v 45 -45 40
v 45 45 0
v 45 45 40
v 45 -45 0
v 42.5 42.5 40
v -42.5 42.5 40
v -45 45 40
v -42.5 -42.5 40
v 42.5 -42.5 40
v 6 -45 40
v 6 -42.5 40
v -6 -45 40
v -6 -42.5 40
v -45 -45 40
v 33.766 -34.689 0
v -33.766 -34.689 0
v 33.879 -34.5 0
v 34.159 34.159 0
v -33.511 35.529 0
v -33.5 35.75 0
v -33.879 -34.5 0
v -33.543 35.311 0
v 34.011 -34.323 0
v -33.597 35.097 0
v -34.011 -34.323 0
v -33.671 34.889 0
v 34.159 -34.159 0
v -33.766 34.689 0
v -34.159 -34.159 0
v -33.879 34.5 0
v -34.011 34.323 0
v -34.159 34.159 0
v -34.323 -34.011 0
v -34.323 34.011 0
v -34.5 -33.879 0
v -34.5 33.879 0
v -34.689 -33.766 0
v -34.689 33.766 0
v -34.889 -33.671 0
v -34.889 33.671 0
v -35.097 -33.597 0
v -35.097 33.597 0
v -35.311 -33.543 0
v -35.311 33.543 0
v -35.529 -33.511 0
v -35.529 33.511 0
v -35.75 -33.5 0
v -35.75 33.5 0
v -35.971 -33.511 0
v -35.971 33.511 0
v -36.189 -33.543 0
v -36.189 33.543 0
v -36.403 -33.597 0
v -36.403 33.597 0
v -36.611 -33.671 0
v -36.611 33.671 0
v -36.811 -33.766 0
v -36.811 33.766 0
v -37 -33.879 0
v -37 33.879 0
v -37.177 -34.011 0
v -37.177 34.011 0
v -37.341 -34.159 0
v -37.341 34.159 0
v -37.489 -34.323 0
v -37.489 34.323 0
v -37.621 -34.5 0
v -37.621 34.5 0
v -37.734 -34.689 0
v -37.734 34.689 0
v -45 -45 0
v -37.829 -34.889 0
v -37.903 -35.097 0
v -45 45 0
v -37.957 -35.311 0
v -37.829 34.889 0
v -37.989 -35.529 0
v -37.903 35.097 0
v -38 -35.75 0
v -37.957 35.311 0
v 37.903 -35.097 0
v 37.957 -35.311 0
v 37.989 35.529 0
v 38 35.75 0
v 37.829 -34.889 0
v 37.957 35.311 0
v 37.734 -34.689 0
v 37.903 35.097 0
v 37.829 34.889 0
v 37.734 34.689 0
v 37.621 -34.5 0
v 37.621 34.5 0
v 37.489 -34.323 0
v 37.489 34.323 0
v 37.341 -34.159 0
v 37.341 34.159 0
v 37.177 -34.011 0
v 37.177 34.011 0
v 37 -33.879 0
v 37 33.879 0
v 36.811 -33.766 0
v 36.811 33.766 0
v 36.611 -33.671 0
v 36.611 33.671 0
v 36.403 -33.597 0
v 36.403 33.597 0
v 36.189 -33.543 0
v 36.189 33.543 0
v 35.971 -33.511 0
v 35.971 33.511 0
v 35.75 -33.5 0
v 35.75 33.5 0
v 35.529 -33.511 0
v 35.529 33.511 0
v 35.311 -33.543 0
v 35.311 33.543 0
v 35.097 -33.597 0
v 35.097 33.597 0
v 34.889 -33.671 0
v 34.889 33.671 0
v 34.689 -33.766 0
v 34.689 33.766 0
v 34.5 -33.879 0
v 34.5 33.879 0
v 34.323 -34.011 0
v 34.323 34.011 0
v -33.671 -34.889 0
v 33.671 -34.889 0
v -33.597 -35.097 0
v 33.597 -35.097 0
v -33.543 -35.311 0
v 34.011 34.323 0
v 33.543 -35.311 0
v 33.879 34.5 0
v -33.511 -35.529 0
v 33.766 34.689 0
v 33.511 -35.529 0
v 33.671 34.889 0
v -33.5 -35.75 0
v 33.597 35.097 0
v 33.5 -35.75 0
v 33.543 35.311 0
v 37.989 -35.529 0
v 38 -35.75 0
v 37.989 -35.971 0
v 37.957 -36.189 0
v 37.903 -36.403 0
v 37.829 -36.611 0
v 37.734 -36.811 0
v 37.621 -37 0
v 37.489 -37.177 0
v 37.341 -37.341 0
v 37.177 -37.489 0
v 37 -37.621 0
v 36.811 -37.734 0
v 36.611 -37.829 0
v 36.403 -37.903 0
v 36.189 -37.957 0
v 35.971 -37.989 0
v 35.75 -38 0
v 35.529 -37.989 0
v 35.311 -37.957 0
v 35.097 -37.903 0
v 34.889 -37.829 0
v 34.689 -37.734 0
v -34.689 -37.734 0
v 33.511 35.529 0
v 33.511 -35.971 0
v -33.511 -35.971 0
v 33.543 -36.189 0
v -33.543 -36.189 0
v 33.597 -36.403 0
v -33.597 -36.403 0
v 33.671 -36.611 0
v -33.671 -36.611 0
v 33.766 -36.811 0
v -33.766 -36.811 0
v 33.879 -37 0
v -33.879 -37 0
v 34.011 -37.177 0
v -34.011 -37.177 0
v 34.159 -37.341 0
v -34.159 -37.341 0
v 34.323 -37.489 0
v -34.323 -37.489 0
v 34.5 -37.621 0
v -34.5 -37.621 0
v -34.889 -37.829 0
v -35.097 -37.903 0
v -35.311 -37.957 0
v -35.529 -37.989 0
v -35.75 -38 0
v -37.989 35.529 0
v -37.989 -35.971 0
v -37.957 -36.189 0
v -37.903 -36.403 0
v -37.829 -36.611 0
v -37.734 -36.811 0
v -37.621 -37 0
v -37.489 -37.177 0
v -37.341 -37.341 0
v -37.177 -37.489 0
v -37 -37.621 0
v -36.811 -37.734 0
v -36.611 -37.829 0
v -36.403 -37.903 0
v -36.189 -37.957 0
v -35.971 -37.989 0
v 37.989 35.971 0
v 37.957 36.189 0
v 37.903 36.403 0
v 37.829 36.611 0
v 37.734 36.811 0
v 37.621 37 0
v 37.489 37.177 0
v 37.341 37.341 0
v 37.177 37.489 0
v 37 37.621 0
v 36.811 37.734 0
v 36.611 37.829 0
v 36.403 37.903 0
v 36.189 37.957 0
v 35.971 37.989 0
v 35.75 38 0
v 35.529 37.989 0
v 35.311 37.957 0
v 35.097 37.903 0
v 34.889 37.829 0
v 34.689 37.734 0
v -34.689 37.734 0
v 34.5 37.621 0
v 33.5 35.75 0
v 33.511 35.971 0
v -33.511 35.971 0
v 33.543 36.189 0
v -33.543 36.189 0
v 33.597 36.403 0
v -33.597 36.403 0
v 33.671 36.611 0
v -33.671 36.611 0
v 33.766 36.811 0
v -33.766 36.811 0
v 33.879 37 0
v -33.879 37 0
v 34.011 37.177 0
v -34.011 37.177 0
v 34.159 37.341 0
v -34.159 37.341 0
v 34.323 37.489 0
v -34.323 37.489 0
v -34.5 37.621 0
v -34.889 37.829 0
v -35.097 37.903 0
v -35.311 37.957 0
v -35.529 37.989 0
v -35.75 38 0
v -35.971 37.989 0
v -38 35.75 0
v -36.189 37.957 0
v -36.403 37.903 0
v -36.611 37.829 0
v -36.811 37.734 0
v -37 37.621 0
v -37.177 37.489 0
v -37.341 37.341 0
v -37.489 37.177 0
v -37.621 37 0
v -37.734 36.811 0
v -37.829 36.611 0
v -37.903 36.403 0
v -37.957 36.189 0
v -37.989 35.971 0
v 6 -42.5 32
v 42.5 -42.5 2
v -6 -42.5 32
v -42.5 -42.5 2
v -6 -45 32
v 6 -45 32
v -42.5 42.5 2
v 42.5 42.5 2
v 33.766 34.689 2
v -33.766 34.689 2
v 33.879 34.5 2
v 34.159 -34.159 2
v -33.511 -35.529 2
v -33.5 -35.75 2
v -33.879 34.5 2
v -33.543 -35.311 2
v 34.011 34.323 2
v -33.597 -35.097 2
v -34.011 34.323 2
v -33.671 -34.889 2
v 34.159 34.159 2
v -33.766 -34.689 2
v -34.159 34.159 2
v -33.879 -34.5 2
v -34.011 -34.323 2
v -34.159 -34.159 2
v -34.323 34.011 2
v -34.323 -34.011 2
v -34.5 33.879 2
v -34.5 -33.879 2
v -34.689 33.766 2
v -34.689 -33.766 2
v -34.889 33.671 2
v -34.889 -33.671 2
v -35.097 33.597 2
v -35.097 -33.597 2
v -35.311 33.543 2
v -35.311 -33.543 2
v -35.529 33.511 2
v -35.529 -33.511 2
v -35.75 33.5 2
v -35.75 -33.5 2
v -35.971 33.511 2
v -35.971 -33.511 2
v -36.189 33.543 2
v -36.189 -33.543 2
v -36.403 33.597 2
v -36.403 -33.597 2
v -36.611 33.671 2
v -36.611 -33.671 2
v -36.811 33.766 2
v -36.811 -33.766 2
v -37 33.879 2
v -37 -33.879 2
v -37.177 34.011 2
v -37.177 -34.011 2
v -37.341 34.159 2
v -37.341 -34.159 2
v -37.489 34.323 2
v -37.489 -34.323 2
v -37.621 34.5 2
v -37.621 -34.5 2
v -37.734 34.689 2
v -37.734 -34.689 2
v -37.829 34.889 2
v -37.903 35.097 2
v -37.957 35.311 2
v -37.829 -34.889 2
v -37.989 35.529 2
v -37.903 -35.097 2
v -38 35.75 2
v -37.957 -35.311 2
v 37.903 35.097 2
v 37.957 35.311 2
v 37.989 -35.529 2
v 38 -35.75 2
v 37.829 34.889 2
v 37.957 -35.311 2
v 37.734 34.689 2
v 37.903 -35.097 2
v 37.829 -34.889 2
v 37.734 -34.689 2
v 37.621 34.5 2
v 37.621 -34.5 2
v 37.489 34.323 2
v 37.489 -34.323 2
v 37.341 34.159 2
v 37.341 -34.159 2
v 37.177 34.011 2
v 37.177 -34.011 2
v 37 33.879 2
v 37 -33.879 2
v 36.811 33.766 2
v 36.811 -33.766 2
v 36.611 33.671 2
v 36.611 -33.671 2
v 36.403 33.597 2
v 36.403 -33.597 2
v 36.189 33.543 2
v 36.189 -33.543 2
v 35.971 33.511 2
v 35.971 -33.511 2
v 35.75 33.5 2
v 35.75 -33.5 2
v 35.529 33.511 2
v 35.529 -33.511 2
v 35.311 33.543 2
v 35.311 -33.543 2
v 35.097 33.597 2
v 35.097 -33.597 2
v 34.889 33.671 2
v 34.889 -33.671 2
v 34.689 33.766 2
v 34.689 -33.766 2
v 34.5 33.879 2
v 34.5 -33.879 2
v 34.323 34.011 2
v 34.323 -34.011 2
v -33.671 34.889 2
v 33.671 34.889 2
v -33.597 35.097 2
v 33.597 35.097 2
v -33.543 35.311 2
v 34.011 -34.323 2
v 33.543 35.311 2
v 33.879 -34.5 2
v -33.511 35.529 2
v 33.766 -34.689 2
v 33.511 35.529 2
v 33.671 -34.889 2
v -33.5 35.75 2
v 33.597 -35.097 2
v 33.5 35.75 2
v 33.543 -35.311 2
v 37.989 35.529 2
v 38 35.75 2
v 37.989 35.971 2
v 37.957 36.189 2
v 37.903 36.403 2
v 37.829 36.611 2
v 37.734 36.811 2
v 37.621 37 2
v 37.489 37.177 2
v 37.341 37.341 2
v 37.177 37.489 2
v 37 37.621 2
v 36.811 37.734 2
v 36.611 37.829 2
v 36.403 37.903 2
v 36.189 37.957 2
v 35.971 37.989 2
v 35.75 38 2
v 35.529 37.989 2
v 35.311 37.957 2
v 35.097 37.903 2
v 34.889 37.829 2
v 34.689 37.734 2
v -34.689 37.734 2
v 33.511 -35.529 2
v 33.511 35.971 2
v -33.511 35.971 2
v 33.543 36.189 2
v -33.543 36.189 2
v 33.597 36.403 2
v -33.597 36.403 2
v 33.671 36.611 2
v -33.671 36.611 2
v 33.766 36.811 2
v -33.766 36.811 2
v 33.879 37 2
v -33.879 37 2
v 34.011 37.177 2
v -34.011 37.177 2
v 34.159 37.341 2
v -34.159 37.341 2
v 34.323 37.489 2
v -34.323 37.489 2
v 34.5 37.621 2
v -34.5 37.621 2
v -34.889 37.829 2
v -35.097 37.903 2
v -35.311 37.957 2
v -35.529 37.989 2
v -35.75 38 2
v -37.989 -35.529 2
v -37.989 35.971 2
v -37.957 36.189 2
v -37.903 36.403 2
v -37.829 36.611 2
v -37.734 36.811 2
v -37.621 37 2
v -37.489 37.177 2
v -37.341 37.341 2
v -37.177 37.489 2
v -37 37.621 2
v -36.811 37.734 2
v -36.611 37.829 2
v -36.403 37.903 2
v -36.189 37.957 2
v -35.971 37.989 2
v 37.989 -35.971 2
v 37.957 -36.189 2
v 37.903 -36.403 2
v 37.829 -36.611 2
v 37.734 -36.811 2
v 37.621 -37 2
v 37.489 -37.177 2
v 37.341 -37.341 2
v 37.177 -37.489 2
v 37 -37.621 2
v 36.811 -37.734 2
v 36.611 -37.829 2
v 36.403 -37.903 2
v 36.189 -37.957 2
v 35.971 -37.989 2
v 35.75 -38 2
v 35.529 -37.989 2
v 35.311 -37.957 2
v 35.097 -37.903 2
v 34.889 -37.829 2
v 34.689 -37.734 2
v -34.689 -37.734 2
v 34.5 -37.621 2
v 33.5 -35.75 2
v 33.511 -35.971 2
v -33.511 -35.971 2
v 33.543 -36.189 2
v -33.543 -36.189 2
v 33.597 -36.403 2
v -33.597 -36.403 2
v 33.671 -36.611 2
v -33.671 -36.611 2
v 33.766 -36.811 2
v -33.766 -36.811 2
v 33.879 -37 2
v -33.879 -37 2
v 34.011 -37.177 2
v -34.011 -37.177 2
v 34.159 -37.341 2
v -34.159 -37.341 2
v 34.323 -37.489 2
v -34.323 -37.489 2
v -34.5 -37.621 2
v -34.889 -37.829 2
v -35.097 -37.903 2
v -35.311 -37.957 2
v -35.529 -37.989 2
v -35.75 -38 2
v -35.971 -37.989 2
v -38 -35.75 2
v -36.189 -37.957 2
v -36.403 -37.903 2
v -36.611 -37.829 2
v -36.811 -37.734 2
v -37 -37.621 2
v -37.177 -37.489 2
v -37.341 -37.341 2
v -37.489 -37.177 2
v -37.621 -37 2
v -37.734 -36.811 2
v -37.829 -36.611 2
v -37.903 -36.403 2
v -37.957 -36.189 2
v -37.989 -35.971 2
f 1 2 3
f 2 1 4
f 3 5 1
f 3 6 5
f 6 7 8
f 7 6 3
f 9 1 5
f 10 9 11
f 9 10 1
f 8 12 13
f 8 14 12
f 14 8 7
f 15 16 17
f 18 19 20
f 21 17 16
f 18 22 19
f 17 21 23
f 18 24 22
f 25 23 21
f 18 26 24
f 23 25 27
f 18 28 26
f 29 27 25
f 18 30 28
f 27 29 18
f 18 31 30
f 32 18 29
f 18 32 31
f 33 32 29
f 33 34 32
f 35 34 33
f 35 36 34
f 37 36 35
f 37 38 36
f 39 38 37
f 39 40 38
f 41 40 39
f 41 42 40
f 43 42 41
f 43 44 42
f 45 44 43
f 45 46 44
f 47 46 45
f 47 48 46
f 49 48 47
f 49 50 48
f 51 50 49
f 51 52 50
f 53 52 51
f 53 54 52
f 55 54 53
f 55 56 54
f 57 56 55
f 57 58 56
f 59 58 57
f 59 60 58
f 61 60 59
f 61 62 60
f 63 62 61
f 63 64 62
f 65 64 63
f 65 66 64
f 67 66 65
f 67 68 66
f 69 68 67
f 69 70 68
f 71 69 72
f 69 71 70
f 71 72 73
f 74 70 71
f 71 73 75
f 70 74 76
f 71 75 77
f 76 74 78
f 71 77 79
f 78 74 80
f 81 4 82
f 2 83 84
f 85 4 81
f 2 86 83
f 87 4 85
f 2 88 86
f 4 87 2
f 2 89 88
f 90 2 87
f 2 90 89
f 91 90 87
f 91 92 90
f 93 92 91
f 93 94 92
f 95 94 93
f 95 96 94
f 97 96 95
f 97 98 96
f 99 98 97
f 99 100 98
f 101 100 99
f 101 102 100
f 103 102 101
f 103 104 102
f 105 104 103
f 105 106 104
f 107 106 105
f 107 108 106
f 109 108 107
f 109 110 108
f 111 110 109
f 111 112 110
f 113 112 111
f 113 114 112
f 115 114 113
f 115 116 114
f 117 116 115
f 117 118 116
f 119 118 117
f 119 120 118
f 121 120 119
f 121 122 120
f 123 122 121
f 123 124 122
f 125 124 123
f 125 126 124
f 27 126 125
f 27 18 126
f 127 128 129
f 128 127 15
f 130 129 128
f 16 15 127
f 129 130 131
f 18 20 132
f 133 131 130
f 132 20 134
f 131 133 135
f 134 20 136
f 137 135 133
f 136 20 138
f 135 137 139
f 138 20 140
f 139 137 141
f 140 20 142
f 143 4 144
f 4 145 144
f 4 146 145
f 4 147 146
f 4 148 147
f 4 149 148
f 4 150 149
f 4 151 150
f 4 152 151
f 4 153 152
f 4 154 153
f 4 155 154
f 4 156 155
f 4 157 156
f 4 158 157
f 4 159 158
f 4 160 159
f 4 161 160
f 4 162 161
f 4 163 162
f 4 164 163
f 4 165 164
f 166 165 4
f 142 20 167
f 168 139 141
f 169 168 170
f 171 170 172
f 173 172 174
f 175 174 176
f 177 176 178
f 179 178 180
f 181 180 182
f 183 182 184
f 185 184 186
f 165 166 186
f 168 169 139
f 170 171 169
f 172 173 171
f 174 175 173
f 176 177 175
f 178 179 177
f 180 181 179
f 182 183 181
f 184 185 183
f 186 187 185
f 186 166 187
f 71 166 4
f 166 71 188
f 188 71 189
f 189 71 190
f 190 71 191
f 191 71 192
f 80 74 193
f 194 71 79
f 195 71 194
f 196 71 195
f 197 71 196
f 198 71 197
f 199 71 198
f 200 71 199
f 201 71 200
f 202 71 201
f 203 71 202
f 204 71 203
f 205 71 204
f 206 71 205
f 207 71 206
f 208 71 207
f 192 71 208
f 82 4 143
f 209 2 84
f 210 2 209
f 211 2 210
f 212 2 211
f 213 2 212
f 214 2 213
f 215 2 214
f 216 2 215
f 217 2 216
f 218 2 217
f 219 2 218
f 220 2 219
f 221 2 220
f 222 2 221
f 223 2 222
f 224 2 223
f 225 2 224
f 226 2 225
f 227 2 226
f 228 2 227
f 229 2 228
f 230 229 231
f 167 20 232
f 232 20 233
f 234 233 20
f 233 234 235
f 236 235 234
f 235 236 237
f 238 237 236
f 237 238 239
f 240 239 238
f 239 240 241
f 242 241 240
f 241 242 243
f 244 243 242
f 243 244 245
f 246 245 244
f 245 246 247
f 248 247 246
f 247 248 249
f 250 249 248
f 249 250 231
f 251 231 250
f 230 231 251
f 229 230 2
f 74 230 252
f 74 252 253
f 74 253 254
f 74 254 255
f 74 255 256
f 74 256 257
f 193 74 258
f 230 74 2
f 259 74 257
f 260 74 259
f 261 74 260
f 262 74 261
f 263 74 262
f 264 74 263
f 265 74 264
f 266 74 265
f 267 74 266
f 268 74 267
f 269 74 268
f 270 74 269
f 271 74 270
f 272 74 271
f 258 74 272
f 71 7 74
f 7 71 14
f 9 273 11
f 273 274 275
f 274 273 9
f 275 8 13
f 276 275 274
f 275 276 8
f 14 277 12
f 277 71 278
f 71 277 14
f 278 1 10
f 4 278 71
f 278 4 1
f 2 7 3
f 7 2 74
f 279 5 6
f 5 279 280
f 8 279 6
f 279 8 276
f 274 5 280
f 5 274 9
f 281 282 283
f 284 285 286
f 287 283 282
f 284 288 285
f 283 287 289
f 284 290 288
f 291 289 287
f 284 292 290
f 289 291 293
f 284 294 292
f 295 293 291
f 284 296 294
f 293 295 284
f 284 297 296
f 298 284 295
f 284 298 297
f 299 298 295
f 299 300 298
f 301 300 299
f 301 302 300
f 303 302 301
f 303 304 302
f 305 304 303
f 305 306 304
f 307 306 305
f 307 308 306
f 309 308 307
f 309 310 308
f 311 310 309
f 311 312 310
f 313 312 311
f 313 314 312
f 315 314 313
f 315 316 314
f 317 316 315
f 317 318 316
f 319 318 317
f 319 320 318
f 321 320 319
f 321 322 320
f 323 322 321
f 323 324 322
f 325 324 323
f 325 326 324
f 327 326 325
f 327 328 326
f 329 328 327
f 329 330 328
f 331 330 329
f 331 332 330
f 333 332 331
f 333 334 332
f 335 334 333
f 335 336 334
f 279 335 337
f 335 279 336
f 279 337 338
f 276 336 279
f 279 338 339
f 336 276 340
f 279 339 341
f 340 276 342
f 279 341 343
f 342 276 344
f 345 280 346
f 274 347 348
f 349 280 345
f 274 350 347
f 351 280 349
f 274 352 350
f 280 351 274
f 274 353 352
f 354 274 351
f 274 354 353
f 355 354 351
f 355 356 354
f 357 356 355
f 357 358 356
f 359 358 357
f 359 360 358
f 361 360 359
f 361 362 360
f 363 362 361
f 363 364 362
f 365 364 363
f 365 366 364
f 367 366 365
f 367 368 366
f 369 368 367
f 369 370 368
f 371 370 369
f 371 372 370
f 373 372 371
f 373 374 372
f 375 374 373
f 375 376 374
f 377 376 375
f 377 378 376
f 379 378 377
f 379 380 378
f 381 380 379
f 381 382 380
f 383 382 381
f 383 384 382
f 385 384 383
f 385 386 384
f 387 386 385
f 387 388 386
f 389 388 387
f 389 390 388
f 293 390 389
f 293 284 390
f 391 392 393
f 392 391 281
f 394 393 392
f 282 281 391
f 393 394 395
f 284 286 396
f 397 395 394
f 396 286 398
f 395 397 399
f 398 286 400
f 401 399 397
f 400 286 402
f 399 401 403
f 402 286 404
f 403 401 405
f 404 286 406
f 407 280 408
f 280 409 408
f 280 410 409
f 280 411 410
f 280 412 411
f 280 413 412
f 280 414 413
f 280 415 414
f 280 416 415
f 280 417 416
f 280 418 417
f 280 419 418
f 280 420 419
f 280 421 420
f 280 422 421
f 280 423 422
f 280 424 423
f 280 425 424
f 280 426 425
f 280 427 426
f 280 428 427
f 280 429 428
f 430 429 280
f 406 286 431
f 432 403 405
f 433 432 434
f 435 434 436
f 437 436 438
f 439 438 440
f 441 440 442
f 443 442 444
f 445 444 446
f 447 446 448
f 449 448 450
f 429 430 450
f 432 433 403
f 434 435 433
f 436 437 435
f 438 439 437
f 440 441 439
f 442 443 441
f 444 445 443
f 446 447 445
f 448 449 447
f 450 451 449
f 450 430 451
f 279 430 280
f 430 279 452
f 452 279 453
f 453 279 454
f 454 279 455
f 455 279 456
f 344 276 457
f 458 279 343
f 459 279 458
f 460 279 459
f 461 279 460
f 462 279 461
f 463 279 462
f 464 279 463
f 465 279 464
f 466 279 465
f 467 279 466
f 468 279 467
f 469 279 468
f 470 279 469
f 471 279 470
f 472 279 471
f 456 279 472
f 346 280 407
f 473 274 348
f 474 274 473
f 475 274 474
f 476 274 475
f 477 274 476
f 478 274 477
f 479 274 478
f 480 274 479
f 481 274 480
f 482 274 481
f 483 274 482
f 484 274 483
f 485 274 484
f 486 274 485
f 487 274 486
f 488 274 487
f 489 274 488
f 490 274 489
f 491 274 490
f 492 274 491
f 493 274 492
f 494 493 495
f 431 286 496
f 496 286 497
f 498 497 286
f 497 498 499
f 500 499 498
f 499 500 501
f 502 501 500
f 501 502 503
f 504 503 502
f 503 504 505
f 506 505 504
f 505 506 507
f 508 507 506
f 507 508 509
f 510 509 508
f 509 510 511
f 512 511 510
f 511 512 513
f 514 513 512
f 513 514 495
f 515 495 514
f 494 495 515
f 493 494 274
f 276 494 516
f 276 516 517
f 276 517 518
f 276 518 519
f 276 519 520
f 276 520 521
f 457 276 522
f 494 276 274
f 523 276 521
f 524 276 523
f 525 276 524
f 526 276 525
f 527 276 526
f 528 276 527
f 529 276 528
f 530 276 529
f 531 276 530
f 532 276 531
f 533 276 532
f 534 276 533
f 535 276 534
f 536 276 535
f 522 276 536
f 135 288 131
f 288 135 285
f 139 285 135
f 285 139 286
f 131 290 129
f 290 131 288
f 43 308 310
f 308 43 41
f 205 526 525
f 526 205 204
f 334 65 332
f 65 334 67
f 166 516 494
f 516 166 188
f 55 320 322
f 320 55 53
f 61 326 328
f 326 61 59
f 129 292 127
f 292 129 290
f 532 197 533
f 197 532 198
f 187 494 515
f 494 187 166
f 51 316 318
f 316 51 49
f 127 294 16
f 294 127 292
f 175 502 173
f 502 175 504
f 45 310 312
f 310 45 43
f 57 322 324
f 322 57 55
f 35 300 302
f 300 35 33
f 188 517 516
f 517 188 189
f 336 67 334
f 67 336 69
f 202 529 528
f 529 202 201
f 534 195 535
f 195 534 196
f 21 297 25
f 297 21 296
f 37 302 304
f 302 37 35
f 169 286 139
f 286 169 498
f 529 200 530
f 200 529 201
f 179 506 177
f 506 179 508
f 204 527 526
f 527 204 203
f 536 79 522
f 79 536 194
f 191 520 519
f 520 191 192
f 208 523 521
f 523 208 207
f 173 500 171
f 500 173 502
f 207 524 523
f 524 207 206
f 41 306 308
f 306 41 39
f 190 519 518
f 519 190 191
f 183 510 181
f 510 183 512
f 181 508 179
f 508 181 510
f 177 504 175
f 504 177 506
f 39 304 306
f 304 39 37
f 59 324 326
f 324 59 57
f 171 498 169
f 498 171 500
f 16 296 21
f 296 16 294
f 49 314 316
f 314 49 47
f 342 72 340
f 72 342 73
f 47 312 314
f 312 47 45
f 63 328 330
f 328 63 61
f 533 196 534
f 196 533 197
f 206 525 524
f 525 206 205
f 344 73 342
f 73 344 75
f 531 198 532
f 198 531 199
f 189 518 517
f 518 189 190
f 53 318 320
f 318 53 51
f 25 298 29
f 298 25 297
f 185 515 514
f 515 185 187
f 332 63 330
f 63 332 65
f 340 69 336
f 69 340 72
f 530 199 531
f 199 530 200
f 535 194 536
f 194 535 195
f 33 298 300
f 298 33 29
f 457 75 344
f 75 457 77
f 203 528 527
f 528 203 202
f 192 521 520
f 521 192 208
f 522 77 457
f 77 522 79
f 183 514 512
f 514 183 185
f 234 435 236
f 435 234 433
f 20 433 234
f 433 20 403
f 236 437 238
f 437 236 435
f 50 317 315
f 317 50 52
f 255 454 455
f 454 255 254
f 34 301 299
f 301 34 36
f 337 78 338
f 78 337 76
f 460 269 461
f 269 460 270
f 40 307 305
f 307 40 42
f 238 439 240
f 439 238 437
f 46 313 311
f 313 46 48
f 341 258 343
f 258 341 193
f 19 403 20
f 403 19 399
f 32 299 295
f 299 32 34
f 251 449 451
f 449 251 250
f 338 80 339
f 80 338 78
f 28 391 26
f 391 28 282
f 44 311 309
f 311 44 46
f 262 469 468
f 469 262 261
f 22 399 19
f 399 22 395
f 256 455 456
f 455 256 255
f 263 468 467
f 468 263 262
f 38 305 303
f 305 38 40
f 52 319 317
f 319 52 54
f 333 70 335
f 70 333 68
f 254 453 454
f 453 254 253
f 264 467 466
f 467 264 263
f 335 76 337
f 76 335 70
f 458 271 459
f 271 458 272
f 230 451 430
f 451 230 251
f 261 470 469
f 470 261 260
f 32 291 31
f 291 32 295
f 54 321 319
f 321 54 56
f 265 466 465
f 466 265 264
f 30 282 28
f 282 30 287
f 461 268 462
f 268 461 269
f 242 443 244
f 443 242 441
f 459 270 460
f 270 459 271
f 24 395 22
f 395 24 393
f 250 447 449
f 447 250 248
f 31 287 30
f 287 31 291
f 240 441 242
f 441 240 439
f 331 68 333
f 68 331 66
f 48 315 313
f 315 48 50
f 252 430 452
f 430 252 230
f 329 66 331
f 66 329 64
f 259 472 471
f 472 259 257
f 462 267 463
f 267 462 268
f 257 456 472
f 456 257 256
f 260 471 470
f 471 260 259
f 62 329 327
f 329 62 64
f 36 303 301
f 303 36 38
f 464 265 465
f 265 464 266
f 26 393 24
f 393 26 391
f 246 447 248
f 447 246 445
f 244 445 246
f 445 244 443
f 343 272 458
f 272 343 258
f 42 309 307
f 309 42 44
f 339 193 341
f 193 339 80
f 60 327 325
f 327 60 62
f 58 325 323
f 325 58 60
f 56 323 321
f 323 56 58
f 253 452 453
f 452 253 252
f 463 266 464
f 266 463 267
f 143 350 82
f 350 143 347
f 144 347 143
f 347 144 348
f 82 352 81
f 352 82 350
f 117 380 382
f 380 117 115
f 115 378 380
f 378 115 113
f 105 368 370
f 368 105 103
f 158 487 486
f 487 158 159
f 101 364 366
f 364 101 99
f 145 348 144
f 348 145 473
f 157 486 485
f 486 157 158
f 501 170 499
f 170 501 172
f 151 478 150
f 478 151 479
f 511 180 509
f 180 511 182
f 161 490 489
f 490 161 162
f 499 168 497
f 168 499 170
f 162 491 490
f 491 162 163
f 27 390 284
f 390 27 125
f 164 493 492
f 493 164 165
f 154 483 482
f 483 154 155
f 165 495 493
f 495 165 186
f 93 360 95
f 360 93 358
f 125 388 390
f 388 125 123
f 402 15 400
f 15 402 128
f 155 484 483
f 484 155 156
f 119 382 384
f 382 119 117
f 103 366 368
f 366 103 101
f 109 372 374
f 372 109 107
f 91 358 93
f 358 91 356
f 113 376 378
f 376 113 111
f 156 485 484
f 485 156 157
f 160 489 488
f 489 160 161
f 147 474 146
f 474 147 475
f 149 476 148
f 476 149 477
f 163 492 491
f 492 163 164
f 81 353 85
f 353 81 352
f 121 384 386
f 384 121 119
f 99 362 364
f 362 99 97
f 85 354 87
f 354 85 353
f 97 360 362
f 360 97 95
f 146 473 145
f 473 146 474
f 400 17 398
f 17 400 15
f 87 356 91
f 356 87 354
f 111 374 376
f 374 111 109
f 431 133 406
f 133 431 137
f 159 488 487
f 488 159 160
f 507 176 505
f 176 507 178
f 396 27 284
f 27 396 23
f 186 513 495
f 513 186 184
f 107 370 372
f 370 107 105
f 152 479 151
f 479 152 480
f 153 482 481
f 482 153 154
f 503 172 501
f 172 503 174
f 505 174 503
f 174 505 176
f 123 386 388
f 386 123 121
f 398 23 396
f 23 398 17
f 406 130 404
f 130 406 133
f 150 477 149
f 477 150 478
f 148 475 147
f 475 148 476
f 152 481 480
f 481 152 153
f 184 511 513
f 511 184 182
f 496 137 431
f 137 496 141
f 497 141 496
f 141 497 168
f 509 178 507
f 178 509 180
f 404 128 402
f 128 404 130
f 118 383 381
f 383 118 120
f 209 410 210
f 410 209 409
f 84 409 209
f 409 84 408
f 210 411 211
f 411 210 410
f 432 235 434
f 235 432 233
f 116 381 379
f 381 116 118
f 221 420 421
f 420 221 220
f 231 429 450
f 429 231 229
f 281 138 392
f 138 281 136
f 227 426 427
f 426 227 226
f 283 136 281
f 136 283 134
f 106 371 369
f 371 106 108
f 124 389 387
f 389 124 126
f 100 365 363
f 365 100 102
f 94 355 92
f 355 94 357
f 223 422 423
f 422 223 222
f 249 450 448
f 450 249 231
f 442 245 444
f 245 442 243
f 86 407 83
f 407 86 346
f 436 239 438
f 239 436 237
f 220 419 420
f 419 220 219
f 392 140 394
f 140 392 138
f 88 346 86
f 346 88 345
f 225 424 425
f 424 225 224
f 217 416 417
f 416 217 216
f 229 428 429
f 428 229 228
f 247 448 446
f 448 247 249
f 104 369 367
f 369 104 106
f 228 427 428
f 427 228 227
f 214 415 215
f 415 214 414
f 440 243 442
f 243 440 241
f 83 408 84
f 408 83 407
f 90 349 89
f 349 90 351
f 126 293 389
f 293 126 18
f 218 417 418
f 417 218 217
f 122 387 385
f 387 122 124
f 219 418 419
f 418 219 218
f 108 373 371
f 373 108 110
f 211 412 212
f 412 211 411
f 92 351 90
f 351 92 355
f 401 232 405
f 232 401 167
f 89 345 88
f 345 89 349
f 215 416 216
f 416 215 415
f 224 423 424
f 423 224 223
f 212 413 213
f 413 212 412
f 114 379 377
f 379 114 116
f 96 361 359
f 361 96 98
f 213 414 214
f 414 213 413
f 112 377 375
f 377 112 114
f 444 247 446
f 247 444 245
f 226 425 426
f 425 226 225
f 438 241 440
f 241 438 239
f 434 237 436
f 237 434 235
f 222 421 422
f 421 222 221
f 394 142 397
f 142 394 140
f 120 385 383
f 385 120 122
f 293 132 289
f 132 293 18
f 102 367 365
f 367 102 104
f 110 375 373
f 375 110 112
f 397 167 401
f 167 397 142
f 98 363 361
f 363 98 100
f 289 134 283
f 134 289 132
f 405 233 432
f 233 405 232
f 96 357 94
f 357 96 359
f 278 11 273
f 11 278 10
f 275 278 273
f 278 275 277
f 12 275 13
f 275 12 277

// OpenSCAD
// Housing for a DIY magnetic stirrer built from an 80 mm PC case fan.
// Modelled in print orientation (upside down): the 2 mm top plate lies on the bed
// (z = 0 to 2) and four 2.5 mm walls rise from it to z = 40, where the box is open.

$fn = 64;

// ---- Dimensions (mm) ----
outer_x   = 90;   // outer size in X
outer_y   = 90;   // outer size in Y
wall_t    = 2.5;  // wall thickness
top_t     = 2;    // top plate thickness (lies on the bed in print orientation)
wall_h    = 40;   // total height of the walls (z = 0 to 40)

hole_d    = 4.5;  // M4 clearance hole diameter in the top plate
hole_pitch= 71.5; // square pitch of the four mounting holes, centred on the plate

notch_w   = 12;   // width of the power-cable notch
notch_top = 40;   // top of the notch (open edge of the box)
notch_bot = 32;   // bottom of the notch (8 mm down from the open edge)

// ---- Base: 2 mm top plate on the bed (z = 0 to 2) ----
module top_plate() {
    translate([-outer_x/2, -outer_y/2, 0])
        cube([outer_x, outer_y, top_t]);
}

// ---- Four walls rising from the plate to z = 40 ----
module walls() { union() {
    // Front wall (negative Y side)
    translate([-outer_x/2, -outer_y/2, 0])
        cube([outer_x, wall_t, wall_h]);

    // Back wall (positive Y side)
    translate([-outer_x/2, outer_y/2 - wall_t, 0])
        cube([outer_x, wall_t, wall_h]);

    // Left wall (negative X side)
    translate([-outer_x/2, -outer_y/2 + wall_t, 0])
        cube([wall_t, outer_y - 2*wall_t, wall_h]);

    // Right wall (positive X side)
    translate([outer_x/2 - wall_t, -outer_y/2 + wall_t, 0])
        cube([wall_t, outer_y - 2*wall_t, wall_h]);
} }

// ---- Four M4 clearance holes through the top plate ----
// 71.5 mm square pattern centred on the plate; each hole is 4.5 mm in diameter.
// The cylinders extend 0.5 mm past each face of the 2 mm plate so no faces are coplanar.
module holes() { for (sx = [-1, 1], sy = [-1, 1])
    translate([sx * hole_pitch/2, sy * hole_pitch/2, -0.5])
        cylinder(h = top_t + 1.0, d = hole_d, $fn = 64); }

// ---- Power-cable notch in one wall (front wall, negative Y side) ----
// 12 mm wide, centred along the wall, from z = 32 to z = 40.
// The cutter starts at the wall's outer face (y = -outer_y/2) and extends 1 mm
// past the inner face, so it spans the full wall thickness and removes the notch.
module notch_cutter() {
    translate([-notch_w/2, -outer_y/2, notch_bot])
        cube([notch_w, wall_t + 1.0, notch_top - notch_bot + 1.0]);
}

// ---- Final solid ----
difference() {
    union() {
        top_plate();
        walls();
    }
    holes();
    notch_cutter();
}
